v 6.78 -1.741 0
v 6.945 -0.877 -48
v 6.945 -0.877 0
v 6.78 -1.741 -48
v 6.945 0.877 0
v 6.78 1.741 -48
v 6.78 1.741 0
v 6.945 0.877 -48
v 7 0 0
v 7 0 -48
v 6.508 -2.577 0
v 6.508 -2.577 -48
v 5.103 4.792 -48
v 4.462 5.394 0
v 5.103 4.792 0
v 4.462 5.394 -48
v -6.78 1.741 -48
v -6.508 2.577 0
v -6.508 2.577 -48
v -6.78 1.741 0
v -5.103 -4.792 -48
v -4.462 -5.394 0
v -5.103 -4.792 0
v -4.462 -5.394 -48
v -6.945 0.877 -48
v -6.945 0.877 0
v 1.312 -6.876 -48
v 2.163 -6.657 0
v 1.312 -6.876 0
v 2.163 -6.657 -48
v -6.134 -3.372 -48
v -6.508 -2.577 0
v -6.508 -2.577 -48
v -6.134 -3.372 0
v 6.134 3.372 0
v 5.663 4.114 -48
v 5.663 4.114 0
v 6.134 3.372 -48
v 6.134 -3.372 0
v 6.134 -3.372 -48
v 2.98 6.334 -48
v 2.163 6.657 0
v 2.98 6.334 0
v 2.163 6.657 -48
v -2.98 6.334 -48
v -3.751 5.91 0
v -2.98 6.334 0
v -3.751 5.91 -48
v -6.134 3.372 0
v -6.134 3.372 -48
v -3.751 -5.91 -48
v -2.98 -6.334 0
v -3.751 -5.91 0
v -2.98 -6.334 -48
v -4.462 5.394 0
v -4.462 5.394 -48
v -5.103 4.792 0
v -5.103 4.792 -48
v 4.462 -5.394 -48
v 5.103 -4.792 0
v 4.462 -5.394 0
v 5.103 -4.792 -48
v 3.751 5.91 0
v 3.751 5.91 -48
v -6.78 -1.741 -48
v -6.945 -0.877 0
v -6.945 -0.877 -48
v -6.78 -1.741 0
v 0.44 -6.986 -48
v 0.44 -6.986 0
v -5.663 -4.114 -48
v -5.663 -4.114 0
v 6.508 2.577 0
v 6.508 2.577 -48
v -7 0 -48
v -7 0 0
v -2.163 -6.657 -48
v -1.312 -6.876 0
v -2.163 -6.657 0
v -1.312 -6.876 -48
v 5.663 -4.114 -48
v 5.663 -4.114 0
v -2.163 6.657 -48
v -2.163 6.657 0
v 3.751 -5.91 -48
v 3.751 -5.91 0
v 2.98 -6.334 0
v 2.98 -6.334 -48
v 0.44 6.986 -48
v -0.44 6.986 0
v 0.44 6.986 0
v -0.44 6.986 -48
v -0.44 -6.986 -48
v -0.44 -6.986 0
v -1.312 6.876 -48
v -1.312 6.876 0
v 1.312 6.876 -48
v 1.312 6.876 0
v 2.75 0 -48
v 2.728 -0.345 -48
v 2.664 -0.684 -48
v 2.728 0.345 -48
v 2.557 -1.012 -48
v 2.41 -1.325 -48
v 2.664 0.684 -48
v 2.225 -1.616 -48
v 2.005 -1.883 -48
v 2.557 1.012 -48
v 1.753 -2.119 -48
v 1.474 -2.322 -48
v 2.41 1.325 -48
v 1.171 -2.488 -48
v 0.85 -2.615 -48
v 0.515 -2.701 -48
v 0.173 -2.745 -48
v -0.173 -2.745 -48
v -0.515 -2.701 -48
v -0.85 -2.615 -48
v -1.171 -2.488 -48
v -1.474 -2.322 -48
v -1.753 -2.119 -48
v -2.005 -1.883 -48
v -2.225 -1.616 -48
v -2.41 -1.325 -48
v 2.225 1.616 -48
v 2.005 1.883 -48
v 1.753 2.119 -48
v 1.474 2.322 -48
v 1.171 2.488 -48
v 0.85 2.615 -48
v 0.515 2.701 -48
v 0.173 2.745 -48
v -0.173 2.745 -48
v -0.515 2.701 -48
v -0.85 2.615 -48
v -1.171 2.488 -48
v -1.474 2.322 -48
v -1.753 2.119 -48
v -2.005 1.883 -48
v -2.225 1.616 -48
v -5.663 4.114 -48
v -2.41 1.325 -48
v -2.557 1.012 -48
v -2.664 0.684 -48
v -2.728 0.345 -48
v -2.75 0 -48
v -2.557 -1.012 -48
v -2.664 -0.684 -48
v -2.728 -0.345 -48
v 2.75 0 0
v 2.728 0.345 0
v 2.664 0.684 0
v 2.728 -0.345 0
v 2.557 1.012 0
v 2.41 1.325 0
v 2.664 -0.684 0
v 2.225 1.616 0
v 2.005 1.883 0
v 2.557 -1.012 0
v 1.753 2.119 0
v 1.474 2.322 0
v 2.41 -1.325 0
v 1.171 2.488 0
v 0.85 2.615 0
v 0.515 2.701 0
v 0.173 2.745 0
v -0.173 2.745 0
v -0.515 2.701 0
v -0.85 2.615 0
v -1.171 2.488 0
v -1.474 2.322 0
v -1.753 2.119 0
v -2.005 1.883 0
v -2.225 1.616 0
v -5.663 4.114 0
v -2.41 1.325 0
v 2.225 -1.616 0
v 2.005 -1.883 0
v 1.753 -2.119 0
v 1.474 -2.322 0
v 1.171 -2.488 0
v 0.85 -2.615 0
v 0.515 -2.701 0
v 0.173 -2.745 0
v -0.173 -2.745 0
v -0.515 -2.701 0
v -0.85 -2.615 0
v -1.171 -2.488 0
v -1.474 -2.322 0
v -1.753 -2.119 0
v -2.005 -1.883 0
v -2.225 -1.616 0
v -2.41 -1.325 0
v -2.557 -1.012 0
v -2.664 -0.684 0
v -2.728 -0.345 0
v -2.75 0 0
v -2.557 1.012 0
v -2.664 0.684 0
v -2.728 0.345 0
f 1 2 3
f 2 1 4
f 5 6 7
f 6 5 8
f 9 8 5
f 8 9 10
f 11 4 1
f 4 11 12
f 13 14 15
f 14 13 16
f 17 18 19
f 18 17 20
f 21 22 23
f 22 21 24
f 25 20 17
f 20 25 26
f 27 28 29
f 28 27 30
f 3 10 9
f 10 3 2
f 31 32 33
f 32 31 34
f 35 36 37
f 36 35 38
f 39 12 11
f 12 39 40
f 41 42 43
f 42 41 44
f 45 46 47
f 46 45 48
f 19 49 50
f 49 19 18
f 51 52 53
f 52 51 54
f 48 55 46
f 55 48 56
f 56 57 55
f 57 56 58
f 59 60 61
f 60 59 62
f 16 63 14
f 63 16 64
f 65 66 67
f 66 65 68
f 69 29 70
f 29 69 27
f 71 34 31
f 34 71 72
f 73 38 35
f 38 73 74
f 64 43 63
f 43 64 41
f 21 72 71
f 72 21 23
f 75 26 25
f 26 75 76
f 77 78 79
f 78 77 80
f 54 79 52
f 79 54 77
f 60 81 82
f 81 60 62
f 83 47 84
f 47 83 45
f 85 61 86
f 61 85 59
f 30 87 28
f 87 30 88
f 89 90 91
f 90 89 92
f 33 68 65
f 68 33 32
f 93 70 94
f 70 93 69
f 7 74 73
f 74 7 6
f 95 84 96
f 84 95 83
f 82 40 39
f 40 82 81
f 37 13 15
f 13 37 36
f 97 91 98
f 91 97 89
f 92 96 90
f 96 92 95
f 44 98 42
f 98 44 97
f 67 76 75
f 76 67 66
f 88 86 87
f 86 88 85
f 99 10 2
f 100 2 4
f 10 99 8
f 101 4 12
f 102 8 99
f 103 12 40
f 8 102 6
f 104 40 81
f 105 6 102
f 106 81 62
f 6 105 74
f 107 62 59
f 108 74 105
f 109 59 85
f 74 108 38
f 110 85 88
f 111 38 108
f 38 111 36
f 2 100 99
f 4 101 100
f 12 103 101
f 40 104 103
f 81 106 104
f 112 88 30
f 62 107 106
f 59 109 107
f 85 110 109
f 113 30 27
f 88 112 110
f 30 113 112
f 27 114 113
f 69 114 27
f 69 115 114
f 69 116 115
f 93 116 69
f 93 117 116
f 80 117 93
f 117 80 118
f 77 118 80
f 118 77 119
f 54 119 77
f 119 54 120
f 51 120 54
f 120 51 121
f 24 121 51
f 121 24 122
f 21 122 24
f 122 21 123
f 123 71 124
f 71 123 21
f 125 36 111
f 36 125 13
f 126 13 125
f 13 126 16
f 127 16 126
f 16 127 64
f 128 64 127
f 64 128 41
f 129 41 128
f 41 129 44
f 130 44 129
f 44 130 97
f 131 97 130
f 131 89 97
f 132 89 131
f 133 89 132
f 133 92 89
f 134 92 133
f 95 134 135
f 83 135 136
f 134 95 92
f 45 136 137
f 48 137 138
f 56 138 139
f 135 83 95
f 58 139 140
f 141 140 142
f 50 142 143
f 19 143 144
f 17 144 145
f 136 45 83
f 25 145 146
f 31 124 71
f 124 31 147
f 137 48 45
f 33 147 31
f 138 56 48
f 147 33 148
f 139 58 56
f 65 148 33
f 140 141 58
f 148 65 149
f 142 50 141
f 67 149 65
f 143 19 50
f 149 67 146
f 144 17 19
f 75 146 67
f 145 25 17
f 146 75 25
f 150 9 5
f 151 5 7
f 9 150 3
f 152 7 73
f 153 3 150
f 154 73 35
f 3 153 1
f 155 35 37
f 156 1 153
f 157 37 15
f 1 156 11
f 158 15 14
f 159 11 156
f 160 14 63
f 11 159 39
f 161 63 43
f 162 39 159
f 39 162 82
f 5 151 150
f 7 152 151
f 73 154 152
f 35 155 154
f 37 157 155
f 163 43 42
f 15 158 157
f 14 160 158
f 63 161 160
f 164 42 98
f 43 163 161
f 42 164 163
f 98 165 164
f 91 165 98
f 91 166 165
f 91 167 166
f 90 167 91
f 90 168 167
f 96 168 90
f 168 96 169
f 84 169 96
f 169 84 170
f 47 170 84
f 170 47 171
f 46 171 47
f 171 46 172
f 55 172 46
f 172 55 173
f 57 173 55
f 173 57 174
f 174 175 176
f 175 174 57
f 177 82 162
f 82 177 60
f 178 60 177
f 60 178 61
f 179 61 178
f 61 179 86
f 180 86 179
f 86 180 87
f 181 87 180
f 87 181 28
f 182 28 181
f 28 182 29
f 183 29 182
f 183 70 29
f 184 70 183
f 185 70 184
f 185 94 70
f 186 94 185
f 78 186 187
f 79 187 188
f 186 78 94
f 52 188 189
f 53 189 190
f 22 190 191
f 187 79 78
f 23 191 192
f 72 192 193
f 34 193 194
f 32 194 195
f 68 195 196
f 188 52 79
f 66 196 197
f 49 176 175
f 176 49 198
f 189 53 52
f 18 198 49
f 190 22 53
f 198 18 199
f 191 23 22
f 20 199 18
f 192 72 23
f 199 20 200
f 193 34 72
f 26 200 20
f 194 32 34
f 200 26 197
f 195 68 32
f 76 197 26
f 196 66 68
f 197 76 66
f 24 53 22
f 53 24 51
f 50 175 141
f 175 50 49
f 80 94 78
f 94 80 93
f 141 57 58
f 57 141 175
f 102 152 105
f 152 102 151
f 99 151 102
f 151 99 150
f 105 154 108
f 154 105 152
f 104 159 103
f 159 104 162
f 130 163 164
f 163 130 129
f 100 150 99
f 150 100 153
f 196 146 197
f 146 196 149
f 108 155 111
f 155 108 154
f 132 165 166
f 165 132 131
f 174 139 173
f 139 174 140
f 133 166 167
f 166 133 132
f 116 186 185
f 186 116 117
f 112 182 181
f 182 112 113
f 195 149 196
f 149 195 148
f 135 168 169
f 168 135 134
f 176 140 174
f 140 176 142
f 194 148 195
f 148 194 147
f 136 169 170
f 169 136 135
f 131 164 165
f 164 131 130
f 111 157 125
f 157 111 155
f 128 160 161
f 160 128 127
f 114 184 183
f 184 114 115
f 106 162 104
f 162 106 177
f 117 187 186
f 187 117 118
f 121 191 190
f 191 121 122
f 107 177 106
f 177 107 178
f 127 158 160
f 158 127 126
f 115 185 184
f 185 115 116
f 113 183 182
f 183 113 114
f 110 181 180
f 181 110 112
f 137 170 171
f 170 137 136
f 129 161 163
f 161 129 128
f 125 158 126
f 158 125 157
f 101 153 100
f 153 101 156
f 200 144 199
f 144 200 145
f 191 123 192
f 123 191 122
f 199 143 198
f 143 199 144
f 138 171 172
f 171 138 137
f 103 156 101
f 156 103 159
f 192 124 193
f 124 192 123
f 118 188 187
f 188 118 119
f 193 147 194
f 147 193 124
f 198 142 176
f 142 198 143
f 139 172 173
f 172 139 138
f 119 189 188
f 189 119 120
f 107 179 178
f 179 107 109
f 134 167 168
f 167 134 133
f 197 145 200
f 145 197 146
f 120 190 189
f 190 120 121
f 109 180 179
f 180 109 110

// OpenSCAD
$fn = 50;


difference() {
	union() {
		translate(v = [0, 0, -48.0000000000]) {
			cylinder(h = 48, r = 7.0000000000);
		}
		cylinder(h = 0, r = 17.0000000000);
	}
	union() {
		#translate(v = [0, 0, -48]) {
			cylinder(h = 48, r = 2.7500000000);
		}
	}
}
